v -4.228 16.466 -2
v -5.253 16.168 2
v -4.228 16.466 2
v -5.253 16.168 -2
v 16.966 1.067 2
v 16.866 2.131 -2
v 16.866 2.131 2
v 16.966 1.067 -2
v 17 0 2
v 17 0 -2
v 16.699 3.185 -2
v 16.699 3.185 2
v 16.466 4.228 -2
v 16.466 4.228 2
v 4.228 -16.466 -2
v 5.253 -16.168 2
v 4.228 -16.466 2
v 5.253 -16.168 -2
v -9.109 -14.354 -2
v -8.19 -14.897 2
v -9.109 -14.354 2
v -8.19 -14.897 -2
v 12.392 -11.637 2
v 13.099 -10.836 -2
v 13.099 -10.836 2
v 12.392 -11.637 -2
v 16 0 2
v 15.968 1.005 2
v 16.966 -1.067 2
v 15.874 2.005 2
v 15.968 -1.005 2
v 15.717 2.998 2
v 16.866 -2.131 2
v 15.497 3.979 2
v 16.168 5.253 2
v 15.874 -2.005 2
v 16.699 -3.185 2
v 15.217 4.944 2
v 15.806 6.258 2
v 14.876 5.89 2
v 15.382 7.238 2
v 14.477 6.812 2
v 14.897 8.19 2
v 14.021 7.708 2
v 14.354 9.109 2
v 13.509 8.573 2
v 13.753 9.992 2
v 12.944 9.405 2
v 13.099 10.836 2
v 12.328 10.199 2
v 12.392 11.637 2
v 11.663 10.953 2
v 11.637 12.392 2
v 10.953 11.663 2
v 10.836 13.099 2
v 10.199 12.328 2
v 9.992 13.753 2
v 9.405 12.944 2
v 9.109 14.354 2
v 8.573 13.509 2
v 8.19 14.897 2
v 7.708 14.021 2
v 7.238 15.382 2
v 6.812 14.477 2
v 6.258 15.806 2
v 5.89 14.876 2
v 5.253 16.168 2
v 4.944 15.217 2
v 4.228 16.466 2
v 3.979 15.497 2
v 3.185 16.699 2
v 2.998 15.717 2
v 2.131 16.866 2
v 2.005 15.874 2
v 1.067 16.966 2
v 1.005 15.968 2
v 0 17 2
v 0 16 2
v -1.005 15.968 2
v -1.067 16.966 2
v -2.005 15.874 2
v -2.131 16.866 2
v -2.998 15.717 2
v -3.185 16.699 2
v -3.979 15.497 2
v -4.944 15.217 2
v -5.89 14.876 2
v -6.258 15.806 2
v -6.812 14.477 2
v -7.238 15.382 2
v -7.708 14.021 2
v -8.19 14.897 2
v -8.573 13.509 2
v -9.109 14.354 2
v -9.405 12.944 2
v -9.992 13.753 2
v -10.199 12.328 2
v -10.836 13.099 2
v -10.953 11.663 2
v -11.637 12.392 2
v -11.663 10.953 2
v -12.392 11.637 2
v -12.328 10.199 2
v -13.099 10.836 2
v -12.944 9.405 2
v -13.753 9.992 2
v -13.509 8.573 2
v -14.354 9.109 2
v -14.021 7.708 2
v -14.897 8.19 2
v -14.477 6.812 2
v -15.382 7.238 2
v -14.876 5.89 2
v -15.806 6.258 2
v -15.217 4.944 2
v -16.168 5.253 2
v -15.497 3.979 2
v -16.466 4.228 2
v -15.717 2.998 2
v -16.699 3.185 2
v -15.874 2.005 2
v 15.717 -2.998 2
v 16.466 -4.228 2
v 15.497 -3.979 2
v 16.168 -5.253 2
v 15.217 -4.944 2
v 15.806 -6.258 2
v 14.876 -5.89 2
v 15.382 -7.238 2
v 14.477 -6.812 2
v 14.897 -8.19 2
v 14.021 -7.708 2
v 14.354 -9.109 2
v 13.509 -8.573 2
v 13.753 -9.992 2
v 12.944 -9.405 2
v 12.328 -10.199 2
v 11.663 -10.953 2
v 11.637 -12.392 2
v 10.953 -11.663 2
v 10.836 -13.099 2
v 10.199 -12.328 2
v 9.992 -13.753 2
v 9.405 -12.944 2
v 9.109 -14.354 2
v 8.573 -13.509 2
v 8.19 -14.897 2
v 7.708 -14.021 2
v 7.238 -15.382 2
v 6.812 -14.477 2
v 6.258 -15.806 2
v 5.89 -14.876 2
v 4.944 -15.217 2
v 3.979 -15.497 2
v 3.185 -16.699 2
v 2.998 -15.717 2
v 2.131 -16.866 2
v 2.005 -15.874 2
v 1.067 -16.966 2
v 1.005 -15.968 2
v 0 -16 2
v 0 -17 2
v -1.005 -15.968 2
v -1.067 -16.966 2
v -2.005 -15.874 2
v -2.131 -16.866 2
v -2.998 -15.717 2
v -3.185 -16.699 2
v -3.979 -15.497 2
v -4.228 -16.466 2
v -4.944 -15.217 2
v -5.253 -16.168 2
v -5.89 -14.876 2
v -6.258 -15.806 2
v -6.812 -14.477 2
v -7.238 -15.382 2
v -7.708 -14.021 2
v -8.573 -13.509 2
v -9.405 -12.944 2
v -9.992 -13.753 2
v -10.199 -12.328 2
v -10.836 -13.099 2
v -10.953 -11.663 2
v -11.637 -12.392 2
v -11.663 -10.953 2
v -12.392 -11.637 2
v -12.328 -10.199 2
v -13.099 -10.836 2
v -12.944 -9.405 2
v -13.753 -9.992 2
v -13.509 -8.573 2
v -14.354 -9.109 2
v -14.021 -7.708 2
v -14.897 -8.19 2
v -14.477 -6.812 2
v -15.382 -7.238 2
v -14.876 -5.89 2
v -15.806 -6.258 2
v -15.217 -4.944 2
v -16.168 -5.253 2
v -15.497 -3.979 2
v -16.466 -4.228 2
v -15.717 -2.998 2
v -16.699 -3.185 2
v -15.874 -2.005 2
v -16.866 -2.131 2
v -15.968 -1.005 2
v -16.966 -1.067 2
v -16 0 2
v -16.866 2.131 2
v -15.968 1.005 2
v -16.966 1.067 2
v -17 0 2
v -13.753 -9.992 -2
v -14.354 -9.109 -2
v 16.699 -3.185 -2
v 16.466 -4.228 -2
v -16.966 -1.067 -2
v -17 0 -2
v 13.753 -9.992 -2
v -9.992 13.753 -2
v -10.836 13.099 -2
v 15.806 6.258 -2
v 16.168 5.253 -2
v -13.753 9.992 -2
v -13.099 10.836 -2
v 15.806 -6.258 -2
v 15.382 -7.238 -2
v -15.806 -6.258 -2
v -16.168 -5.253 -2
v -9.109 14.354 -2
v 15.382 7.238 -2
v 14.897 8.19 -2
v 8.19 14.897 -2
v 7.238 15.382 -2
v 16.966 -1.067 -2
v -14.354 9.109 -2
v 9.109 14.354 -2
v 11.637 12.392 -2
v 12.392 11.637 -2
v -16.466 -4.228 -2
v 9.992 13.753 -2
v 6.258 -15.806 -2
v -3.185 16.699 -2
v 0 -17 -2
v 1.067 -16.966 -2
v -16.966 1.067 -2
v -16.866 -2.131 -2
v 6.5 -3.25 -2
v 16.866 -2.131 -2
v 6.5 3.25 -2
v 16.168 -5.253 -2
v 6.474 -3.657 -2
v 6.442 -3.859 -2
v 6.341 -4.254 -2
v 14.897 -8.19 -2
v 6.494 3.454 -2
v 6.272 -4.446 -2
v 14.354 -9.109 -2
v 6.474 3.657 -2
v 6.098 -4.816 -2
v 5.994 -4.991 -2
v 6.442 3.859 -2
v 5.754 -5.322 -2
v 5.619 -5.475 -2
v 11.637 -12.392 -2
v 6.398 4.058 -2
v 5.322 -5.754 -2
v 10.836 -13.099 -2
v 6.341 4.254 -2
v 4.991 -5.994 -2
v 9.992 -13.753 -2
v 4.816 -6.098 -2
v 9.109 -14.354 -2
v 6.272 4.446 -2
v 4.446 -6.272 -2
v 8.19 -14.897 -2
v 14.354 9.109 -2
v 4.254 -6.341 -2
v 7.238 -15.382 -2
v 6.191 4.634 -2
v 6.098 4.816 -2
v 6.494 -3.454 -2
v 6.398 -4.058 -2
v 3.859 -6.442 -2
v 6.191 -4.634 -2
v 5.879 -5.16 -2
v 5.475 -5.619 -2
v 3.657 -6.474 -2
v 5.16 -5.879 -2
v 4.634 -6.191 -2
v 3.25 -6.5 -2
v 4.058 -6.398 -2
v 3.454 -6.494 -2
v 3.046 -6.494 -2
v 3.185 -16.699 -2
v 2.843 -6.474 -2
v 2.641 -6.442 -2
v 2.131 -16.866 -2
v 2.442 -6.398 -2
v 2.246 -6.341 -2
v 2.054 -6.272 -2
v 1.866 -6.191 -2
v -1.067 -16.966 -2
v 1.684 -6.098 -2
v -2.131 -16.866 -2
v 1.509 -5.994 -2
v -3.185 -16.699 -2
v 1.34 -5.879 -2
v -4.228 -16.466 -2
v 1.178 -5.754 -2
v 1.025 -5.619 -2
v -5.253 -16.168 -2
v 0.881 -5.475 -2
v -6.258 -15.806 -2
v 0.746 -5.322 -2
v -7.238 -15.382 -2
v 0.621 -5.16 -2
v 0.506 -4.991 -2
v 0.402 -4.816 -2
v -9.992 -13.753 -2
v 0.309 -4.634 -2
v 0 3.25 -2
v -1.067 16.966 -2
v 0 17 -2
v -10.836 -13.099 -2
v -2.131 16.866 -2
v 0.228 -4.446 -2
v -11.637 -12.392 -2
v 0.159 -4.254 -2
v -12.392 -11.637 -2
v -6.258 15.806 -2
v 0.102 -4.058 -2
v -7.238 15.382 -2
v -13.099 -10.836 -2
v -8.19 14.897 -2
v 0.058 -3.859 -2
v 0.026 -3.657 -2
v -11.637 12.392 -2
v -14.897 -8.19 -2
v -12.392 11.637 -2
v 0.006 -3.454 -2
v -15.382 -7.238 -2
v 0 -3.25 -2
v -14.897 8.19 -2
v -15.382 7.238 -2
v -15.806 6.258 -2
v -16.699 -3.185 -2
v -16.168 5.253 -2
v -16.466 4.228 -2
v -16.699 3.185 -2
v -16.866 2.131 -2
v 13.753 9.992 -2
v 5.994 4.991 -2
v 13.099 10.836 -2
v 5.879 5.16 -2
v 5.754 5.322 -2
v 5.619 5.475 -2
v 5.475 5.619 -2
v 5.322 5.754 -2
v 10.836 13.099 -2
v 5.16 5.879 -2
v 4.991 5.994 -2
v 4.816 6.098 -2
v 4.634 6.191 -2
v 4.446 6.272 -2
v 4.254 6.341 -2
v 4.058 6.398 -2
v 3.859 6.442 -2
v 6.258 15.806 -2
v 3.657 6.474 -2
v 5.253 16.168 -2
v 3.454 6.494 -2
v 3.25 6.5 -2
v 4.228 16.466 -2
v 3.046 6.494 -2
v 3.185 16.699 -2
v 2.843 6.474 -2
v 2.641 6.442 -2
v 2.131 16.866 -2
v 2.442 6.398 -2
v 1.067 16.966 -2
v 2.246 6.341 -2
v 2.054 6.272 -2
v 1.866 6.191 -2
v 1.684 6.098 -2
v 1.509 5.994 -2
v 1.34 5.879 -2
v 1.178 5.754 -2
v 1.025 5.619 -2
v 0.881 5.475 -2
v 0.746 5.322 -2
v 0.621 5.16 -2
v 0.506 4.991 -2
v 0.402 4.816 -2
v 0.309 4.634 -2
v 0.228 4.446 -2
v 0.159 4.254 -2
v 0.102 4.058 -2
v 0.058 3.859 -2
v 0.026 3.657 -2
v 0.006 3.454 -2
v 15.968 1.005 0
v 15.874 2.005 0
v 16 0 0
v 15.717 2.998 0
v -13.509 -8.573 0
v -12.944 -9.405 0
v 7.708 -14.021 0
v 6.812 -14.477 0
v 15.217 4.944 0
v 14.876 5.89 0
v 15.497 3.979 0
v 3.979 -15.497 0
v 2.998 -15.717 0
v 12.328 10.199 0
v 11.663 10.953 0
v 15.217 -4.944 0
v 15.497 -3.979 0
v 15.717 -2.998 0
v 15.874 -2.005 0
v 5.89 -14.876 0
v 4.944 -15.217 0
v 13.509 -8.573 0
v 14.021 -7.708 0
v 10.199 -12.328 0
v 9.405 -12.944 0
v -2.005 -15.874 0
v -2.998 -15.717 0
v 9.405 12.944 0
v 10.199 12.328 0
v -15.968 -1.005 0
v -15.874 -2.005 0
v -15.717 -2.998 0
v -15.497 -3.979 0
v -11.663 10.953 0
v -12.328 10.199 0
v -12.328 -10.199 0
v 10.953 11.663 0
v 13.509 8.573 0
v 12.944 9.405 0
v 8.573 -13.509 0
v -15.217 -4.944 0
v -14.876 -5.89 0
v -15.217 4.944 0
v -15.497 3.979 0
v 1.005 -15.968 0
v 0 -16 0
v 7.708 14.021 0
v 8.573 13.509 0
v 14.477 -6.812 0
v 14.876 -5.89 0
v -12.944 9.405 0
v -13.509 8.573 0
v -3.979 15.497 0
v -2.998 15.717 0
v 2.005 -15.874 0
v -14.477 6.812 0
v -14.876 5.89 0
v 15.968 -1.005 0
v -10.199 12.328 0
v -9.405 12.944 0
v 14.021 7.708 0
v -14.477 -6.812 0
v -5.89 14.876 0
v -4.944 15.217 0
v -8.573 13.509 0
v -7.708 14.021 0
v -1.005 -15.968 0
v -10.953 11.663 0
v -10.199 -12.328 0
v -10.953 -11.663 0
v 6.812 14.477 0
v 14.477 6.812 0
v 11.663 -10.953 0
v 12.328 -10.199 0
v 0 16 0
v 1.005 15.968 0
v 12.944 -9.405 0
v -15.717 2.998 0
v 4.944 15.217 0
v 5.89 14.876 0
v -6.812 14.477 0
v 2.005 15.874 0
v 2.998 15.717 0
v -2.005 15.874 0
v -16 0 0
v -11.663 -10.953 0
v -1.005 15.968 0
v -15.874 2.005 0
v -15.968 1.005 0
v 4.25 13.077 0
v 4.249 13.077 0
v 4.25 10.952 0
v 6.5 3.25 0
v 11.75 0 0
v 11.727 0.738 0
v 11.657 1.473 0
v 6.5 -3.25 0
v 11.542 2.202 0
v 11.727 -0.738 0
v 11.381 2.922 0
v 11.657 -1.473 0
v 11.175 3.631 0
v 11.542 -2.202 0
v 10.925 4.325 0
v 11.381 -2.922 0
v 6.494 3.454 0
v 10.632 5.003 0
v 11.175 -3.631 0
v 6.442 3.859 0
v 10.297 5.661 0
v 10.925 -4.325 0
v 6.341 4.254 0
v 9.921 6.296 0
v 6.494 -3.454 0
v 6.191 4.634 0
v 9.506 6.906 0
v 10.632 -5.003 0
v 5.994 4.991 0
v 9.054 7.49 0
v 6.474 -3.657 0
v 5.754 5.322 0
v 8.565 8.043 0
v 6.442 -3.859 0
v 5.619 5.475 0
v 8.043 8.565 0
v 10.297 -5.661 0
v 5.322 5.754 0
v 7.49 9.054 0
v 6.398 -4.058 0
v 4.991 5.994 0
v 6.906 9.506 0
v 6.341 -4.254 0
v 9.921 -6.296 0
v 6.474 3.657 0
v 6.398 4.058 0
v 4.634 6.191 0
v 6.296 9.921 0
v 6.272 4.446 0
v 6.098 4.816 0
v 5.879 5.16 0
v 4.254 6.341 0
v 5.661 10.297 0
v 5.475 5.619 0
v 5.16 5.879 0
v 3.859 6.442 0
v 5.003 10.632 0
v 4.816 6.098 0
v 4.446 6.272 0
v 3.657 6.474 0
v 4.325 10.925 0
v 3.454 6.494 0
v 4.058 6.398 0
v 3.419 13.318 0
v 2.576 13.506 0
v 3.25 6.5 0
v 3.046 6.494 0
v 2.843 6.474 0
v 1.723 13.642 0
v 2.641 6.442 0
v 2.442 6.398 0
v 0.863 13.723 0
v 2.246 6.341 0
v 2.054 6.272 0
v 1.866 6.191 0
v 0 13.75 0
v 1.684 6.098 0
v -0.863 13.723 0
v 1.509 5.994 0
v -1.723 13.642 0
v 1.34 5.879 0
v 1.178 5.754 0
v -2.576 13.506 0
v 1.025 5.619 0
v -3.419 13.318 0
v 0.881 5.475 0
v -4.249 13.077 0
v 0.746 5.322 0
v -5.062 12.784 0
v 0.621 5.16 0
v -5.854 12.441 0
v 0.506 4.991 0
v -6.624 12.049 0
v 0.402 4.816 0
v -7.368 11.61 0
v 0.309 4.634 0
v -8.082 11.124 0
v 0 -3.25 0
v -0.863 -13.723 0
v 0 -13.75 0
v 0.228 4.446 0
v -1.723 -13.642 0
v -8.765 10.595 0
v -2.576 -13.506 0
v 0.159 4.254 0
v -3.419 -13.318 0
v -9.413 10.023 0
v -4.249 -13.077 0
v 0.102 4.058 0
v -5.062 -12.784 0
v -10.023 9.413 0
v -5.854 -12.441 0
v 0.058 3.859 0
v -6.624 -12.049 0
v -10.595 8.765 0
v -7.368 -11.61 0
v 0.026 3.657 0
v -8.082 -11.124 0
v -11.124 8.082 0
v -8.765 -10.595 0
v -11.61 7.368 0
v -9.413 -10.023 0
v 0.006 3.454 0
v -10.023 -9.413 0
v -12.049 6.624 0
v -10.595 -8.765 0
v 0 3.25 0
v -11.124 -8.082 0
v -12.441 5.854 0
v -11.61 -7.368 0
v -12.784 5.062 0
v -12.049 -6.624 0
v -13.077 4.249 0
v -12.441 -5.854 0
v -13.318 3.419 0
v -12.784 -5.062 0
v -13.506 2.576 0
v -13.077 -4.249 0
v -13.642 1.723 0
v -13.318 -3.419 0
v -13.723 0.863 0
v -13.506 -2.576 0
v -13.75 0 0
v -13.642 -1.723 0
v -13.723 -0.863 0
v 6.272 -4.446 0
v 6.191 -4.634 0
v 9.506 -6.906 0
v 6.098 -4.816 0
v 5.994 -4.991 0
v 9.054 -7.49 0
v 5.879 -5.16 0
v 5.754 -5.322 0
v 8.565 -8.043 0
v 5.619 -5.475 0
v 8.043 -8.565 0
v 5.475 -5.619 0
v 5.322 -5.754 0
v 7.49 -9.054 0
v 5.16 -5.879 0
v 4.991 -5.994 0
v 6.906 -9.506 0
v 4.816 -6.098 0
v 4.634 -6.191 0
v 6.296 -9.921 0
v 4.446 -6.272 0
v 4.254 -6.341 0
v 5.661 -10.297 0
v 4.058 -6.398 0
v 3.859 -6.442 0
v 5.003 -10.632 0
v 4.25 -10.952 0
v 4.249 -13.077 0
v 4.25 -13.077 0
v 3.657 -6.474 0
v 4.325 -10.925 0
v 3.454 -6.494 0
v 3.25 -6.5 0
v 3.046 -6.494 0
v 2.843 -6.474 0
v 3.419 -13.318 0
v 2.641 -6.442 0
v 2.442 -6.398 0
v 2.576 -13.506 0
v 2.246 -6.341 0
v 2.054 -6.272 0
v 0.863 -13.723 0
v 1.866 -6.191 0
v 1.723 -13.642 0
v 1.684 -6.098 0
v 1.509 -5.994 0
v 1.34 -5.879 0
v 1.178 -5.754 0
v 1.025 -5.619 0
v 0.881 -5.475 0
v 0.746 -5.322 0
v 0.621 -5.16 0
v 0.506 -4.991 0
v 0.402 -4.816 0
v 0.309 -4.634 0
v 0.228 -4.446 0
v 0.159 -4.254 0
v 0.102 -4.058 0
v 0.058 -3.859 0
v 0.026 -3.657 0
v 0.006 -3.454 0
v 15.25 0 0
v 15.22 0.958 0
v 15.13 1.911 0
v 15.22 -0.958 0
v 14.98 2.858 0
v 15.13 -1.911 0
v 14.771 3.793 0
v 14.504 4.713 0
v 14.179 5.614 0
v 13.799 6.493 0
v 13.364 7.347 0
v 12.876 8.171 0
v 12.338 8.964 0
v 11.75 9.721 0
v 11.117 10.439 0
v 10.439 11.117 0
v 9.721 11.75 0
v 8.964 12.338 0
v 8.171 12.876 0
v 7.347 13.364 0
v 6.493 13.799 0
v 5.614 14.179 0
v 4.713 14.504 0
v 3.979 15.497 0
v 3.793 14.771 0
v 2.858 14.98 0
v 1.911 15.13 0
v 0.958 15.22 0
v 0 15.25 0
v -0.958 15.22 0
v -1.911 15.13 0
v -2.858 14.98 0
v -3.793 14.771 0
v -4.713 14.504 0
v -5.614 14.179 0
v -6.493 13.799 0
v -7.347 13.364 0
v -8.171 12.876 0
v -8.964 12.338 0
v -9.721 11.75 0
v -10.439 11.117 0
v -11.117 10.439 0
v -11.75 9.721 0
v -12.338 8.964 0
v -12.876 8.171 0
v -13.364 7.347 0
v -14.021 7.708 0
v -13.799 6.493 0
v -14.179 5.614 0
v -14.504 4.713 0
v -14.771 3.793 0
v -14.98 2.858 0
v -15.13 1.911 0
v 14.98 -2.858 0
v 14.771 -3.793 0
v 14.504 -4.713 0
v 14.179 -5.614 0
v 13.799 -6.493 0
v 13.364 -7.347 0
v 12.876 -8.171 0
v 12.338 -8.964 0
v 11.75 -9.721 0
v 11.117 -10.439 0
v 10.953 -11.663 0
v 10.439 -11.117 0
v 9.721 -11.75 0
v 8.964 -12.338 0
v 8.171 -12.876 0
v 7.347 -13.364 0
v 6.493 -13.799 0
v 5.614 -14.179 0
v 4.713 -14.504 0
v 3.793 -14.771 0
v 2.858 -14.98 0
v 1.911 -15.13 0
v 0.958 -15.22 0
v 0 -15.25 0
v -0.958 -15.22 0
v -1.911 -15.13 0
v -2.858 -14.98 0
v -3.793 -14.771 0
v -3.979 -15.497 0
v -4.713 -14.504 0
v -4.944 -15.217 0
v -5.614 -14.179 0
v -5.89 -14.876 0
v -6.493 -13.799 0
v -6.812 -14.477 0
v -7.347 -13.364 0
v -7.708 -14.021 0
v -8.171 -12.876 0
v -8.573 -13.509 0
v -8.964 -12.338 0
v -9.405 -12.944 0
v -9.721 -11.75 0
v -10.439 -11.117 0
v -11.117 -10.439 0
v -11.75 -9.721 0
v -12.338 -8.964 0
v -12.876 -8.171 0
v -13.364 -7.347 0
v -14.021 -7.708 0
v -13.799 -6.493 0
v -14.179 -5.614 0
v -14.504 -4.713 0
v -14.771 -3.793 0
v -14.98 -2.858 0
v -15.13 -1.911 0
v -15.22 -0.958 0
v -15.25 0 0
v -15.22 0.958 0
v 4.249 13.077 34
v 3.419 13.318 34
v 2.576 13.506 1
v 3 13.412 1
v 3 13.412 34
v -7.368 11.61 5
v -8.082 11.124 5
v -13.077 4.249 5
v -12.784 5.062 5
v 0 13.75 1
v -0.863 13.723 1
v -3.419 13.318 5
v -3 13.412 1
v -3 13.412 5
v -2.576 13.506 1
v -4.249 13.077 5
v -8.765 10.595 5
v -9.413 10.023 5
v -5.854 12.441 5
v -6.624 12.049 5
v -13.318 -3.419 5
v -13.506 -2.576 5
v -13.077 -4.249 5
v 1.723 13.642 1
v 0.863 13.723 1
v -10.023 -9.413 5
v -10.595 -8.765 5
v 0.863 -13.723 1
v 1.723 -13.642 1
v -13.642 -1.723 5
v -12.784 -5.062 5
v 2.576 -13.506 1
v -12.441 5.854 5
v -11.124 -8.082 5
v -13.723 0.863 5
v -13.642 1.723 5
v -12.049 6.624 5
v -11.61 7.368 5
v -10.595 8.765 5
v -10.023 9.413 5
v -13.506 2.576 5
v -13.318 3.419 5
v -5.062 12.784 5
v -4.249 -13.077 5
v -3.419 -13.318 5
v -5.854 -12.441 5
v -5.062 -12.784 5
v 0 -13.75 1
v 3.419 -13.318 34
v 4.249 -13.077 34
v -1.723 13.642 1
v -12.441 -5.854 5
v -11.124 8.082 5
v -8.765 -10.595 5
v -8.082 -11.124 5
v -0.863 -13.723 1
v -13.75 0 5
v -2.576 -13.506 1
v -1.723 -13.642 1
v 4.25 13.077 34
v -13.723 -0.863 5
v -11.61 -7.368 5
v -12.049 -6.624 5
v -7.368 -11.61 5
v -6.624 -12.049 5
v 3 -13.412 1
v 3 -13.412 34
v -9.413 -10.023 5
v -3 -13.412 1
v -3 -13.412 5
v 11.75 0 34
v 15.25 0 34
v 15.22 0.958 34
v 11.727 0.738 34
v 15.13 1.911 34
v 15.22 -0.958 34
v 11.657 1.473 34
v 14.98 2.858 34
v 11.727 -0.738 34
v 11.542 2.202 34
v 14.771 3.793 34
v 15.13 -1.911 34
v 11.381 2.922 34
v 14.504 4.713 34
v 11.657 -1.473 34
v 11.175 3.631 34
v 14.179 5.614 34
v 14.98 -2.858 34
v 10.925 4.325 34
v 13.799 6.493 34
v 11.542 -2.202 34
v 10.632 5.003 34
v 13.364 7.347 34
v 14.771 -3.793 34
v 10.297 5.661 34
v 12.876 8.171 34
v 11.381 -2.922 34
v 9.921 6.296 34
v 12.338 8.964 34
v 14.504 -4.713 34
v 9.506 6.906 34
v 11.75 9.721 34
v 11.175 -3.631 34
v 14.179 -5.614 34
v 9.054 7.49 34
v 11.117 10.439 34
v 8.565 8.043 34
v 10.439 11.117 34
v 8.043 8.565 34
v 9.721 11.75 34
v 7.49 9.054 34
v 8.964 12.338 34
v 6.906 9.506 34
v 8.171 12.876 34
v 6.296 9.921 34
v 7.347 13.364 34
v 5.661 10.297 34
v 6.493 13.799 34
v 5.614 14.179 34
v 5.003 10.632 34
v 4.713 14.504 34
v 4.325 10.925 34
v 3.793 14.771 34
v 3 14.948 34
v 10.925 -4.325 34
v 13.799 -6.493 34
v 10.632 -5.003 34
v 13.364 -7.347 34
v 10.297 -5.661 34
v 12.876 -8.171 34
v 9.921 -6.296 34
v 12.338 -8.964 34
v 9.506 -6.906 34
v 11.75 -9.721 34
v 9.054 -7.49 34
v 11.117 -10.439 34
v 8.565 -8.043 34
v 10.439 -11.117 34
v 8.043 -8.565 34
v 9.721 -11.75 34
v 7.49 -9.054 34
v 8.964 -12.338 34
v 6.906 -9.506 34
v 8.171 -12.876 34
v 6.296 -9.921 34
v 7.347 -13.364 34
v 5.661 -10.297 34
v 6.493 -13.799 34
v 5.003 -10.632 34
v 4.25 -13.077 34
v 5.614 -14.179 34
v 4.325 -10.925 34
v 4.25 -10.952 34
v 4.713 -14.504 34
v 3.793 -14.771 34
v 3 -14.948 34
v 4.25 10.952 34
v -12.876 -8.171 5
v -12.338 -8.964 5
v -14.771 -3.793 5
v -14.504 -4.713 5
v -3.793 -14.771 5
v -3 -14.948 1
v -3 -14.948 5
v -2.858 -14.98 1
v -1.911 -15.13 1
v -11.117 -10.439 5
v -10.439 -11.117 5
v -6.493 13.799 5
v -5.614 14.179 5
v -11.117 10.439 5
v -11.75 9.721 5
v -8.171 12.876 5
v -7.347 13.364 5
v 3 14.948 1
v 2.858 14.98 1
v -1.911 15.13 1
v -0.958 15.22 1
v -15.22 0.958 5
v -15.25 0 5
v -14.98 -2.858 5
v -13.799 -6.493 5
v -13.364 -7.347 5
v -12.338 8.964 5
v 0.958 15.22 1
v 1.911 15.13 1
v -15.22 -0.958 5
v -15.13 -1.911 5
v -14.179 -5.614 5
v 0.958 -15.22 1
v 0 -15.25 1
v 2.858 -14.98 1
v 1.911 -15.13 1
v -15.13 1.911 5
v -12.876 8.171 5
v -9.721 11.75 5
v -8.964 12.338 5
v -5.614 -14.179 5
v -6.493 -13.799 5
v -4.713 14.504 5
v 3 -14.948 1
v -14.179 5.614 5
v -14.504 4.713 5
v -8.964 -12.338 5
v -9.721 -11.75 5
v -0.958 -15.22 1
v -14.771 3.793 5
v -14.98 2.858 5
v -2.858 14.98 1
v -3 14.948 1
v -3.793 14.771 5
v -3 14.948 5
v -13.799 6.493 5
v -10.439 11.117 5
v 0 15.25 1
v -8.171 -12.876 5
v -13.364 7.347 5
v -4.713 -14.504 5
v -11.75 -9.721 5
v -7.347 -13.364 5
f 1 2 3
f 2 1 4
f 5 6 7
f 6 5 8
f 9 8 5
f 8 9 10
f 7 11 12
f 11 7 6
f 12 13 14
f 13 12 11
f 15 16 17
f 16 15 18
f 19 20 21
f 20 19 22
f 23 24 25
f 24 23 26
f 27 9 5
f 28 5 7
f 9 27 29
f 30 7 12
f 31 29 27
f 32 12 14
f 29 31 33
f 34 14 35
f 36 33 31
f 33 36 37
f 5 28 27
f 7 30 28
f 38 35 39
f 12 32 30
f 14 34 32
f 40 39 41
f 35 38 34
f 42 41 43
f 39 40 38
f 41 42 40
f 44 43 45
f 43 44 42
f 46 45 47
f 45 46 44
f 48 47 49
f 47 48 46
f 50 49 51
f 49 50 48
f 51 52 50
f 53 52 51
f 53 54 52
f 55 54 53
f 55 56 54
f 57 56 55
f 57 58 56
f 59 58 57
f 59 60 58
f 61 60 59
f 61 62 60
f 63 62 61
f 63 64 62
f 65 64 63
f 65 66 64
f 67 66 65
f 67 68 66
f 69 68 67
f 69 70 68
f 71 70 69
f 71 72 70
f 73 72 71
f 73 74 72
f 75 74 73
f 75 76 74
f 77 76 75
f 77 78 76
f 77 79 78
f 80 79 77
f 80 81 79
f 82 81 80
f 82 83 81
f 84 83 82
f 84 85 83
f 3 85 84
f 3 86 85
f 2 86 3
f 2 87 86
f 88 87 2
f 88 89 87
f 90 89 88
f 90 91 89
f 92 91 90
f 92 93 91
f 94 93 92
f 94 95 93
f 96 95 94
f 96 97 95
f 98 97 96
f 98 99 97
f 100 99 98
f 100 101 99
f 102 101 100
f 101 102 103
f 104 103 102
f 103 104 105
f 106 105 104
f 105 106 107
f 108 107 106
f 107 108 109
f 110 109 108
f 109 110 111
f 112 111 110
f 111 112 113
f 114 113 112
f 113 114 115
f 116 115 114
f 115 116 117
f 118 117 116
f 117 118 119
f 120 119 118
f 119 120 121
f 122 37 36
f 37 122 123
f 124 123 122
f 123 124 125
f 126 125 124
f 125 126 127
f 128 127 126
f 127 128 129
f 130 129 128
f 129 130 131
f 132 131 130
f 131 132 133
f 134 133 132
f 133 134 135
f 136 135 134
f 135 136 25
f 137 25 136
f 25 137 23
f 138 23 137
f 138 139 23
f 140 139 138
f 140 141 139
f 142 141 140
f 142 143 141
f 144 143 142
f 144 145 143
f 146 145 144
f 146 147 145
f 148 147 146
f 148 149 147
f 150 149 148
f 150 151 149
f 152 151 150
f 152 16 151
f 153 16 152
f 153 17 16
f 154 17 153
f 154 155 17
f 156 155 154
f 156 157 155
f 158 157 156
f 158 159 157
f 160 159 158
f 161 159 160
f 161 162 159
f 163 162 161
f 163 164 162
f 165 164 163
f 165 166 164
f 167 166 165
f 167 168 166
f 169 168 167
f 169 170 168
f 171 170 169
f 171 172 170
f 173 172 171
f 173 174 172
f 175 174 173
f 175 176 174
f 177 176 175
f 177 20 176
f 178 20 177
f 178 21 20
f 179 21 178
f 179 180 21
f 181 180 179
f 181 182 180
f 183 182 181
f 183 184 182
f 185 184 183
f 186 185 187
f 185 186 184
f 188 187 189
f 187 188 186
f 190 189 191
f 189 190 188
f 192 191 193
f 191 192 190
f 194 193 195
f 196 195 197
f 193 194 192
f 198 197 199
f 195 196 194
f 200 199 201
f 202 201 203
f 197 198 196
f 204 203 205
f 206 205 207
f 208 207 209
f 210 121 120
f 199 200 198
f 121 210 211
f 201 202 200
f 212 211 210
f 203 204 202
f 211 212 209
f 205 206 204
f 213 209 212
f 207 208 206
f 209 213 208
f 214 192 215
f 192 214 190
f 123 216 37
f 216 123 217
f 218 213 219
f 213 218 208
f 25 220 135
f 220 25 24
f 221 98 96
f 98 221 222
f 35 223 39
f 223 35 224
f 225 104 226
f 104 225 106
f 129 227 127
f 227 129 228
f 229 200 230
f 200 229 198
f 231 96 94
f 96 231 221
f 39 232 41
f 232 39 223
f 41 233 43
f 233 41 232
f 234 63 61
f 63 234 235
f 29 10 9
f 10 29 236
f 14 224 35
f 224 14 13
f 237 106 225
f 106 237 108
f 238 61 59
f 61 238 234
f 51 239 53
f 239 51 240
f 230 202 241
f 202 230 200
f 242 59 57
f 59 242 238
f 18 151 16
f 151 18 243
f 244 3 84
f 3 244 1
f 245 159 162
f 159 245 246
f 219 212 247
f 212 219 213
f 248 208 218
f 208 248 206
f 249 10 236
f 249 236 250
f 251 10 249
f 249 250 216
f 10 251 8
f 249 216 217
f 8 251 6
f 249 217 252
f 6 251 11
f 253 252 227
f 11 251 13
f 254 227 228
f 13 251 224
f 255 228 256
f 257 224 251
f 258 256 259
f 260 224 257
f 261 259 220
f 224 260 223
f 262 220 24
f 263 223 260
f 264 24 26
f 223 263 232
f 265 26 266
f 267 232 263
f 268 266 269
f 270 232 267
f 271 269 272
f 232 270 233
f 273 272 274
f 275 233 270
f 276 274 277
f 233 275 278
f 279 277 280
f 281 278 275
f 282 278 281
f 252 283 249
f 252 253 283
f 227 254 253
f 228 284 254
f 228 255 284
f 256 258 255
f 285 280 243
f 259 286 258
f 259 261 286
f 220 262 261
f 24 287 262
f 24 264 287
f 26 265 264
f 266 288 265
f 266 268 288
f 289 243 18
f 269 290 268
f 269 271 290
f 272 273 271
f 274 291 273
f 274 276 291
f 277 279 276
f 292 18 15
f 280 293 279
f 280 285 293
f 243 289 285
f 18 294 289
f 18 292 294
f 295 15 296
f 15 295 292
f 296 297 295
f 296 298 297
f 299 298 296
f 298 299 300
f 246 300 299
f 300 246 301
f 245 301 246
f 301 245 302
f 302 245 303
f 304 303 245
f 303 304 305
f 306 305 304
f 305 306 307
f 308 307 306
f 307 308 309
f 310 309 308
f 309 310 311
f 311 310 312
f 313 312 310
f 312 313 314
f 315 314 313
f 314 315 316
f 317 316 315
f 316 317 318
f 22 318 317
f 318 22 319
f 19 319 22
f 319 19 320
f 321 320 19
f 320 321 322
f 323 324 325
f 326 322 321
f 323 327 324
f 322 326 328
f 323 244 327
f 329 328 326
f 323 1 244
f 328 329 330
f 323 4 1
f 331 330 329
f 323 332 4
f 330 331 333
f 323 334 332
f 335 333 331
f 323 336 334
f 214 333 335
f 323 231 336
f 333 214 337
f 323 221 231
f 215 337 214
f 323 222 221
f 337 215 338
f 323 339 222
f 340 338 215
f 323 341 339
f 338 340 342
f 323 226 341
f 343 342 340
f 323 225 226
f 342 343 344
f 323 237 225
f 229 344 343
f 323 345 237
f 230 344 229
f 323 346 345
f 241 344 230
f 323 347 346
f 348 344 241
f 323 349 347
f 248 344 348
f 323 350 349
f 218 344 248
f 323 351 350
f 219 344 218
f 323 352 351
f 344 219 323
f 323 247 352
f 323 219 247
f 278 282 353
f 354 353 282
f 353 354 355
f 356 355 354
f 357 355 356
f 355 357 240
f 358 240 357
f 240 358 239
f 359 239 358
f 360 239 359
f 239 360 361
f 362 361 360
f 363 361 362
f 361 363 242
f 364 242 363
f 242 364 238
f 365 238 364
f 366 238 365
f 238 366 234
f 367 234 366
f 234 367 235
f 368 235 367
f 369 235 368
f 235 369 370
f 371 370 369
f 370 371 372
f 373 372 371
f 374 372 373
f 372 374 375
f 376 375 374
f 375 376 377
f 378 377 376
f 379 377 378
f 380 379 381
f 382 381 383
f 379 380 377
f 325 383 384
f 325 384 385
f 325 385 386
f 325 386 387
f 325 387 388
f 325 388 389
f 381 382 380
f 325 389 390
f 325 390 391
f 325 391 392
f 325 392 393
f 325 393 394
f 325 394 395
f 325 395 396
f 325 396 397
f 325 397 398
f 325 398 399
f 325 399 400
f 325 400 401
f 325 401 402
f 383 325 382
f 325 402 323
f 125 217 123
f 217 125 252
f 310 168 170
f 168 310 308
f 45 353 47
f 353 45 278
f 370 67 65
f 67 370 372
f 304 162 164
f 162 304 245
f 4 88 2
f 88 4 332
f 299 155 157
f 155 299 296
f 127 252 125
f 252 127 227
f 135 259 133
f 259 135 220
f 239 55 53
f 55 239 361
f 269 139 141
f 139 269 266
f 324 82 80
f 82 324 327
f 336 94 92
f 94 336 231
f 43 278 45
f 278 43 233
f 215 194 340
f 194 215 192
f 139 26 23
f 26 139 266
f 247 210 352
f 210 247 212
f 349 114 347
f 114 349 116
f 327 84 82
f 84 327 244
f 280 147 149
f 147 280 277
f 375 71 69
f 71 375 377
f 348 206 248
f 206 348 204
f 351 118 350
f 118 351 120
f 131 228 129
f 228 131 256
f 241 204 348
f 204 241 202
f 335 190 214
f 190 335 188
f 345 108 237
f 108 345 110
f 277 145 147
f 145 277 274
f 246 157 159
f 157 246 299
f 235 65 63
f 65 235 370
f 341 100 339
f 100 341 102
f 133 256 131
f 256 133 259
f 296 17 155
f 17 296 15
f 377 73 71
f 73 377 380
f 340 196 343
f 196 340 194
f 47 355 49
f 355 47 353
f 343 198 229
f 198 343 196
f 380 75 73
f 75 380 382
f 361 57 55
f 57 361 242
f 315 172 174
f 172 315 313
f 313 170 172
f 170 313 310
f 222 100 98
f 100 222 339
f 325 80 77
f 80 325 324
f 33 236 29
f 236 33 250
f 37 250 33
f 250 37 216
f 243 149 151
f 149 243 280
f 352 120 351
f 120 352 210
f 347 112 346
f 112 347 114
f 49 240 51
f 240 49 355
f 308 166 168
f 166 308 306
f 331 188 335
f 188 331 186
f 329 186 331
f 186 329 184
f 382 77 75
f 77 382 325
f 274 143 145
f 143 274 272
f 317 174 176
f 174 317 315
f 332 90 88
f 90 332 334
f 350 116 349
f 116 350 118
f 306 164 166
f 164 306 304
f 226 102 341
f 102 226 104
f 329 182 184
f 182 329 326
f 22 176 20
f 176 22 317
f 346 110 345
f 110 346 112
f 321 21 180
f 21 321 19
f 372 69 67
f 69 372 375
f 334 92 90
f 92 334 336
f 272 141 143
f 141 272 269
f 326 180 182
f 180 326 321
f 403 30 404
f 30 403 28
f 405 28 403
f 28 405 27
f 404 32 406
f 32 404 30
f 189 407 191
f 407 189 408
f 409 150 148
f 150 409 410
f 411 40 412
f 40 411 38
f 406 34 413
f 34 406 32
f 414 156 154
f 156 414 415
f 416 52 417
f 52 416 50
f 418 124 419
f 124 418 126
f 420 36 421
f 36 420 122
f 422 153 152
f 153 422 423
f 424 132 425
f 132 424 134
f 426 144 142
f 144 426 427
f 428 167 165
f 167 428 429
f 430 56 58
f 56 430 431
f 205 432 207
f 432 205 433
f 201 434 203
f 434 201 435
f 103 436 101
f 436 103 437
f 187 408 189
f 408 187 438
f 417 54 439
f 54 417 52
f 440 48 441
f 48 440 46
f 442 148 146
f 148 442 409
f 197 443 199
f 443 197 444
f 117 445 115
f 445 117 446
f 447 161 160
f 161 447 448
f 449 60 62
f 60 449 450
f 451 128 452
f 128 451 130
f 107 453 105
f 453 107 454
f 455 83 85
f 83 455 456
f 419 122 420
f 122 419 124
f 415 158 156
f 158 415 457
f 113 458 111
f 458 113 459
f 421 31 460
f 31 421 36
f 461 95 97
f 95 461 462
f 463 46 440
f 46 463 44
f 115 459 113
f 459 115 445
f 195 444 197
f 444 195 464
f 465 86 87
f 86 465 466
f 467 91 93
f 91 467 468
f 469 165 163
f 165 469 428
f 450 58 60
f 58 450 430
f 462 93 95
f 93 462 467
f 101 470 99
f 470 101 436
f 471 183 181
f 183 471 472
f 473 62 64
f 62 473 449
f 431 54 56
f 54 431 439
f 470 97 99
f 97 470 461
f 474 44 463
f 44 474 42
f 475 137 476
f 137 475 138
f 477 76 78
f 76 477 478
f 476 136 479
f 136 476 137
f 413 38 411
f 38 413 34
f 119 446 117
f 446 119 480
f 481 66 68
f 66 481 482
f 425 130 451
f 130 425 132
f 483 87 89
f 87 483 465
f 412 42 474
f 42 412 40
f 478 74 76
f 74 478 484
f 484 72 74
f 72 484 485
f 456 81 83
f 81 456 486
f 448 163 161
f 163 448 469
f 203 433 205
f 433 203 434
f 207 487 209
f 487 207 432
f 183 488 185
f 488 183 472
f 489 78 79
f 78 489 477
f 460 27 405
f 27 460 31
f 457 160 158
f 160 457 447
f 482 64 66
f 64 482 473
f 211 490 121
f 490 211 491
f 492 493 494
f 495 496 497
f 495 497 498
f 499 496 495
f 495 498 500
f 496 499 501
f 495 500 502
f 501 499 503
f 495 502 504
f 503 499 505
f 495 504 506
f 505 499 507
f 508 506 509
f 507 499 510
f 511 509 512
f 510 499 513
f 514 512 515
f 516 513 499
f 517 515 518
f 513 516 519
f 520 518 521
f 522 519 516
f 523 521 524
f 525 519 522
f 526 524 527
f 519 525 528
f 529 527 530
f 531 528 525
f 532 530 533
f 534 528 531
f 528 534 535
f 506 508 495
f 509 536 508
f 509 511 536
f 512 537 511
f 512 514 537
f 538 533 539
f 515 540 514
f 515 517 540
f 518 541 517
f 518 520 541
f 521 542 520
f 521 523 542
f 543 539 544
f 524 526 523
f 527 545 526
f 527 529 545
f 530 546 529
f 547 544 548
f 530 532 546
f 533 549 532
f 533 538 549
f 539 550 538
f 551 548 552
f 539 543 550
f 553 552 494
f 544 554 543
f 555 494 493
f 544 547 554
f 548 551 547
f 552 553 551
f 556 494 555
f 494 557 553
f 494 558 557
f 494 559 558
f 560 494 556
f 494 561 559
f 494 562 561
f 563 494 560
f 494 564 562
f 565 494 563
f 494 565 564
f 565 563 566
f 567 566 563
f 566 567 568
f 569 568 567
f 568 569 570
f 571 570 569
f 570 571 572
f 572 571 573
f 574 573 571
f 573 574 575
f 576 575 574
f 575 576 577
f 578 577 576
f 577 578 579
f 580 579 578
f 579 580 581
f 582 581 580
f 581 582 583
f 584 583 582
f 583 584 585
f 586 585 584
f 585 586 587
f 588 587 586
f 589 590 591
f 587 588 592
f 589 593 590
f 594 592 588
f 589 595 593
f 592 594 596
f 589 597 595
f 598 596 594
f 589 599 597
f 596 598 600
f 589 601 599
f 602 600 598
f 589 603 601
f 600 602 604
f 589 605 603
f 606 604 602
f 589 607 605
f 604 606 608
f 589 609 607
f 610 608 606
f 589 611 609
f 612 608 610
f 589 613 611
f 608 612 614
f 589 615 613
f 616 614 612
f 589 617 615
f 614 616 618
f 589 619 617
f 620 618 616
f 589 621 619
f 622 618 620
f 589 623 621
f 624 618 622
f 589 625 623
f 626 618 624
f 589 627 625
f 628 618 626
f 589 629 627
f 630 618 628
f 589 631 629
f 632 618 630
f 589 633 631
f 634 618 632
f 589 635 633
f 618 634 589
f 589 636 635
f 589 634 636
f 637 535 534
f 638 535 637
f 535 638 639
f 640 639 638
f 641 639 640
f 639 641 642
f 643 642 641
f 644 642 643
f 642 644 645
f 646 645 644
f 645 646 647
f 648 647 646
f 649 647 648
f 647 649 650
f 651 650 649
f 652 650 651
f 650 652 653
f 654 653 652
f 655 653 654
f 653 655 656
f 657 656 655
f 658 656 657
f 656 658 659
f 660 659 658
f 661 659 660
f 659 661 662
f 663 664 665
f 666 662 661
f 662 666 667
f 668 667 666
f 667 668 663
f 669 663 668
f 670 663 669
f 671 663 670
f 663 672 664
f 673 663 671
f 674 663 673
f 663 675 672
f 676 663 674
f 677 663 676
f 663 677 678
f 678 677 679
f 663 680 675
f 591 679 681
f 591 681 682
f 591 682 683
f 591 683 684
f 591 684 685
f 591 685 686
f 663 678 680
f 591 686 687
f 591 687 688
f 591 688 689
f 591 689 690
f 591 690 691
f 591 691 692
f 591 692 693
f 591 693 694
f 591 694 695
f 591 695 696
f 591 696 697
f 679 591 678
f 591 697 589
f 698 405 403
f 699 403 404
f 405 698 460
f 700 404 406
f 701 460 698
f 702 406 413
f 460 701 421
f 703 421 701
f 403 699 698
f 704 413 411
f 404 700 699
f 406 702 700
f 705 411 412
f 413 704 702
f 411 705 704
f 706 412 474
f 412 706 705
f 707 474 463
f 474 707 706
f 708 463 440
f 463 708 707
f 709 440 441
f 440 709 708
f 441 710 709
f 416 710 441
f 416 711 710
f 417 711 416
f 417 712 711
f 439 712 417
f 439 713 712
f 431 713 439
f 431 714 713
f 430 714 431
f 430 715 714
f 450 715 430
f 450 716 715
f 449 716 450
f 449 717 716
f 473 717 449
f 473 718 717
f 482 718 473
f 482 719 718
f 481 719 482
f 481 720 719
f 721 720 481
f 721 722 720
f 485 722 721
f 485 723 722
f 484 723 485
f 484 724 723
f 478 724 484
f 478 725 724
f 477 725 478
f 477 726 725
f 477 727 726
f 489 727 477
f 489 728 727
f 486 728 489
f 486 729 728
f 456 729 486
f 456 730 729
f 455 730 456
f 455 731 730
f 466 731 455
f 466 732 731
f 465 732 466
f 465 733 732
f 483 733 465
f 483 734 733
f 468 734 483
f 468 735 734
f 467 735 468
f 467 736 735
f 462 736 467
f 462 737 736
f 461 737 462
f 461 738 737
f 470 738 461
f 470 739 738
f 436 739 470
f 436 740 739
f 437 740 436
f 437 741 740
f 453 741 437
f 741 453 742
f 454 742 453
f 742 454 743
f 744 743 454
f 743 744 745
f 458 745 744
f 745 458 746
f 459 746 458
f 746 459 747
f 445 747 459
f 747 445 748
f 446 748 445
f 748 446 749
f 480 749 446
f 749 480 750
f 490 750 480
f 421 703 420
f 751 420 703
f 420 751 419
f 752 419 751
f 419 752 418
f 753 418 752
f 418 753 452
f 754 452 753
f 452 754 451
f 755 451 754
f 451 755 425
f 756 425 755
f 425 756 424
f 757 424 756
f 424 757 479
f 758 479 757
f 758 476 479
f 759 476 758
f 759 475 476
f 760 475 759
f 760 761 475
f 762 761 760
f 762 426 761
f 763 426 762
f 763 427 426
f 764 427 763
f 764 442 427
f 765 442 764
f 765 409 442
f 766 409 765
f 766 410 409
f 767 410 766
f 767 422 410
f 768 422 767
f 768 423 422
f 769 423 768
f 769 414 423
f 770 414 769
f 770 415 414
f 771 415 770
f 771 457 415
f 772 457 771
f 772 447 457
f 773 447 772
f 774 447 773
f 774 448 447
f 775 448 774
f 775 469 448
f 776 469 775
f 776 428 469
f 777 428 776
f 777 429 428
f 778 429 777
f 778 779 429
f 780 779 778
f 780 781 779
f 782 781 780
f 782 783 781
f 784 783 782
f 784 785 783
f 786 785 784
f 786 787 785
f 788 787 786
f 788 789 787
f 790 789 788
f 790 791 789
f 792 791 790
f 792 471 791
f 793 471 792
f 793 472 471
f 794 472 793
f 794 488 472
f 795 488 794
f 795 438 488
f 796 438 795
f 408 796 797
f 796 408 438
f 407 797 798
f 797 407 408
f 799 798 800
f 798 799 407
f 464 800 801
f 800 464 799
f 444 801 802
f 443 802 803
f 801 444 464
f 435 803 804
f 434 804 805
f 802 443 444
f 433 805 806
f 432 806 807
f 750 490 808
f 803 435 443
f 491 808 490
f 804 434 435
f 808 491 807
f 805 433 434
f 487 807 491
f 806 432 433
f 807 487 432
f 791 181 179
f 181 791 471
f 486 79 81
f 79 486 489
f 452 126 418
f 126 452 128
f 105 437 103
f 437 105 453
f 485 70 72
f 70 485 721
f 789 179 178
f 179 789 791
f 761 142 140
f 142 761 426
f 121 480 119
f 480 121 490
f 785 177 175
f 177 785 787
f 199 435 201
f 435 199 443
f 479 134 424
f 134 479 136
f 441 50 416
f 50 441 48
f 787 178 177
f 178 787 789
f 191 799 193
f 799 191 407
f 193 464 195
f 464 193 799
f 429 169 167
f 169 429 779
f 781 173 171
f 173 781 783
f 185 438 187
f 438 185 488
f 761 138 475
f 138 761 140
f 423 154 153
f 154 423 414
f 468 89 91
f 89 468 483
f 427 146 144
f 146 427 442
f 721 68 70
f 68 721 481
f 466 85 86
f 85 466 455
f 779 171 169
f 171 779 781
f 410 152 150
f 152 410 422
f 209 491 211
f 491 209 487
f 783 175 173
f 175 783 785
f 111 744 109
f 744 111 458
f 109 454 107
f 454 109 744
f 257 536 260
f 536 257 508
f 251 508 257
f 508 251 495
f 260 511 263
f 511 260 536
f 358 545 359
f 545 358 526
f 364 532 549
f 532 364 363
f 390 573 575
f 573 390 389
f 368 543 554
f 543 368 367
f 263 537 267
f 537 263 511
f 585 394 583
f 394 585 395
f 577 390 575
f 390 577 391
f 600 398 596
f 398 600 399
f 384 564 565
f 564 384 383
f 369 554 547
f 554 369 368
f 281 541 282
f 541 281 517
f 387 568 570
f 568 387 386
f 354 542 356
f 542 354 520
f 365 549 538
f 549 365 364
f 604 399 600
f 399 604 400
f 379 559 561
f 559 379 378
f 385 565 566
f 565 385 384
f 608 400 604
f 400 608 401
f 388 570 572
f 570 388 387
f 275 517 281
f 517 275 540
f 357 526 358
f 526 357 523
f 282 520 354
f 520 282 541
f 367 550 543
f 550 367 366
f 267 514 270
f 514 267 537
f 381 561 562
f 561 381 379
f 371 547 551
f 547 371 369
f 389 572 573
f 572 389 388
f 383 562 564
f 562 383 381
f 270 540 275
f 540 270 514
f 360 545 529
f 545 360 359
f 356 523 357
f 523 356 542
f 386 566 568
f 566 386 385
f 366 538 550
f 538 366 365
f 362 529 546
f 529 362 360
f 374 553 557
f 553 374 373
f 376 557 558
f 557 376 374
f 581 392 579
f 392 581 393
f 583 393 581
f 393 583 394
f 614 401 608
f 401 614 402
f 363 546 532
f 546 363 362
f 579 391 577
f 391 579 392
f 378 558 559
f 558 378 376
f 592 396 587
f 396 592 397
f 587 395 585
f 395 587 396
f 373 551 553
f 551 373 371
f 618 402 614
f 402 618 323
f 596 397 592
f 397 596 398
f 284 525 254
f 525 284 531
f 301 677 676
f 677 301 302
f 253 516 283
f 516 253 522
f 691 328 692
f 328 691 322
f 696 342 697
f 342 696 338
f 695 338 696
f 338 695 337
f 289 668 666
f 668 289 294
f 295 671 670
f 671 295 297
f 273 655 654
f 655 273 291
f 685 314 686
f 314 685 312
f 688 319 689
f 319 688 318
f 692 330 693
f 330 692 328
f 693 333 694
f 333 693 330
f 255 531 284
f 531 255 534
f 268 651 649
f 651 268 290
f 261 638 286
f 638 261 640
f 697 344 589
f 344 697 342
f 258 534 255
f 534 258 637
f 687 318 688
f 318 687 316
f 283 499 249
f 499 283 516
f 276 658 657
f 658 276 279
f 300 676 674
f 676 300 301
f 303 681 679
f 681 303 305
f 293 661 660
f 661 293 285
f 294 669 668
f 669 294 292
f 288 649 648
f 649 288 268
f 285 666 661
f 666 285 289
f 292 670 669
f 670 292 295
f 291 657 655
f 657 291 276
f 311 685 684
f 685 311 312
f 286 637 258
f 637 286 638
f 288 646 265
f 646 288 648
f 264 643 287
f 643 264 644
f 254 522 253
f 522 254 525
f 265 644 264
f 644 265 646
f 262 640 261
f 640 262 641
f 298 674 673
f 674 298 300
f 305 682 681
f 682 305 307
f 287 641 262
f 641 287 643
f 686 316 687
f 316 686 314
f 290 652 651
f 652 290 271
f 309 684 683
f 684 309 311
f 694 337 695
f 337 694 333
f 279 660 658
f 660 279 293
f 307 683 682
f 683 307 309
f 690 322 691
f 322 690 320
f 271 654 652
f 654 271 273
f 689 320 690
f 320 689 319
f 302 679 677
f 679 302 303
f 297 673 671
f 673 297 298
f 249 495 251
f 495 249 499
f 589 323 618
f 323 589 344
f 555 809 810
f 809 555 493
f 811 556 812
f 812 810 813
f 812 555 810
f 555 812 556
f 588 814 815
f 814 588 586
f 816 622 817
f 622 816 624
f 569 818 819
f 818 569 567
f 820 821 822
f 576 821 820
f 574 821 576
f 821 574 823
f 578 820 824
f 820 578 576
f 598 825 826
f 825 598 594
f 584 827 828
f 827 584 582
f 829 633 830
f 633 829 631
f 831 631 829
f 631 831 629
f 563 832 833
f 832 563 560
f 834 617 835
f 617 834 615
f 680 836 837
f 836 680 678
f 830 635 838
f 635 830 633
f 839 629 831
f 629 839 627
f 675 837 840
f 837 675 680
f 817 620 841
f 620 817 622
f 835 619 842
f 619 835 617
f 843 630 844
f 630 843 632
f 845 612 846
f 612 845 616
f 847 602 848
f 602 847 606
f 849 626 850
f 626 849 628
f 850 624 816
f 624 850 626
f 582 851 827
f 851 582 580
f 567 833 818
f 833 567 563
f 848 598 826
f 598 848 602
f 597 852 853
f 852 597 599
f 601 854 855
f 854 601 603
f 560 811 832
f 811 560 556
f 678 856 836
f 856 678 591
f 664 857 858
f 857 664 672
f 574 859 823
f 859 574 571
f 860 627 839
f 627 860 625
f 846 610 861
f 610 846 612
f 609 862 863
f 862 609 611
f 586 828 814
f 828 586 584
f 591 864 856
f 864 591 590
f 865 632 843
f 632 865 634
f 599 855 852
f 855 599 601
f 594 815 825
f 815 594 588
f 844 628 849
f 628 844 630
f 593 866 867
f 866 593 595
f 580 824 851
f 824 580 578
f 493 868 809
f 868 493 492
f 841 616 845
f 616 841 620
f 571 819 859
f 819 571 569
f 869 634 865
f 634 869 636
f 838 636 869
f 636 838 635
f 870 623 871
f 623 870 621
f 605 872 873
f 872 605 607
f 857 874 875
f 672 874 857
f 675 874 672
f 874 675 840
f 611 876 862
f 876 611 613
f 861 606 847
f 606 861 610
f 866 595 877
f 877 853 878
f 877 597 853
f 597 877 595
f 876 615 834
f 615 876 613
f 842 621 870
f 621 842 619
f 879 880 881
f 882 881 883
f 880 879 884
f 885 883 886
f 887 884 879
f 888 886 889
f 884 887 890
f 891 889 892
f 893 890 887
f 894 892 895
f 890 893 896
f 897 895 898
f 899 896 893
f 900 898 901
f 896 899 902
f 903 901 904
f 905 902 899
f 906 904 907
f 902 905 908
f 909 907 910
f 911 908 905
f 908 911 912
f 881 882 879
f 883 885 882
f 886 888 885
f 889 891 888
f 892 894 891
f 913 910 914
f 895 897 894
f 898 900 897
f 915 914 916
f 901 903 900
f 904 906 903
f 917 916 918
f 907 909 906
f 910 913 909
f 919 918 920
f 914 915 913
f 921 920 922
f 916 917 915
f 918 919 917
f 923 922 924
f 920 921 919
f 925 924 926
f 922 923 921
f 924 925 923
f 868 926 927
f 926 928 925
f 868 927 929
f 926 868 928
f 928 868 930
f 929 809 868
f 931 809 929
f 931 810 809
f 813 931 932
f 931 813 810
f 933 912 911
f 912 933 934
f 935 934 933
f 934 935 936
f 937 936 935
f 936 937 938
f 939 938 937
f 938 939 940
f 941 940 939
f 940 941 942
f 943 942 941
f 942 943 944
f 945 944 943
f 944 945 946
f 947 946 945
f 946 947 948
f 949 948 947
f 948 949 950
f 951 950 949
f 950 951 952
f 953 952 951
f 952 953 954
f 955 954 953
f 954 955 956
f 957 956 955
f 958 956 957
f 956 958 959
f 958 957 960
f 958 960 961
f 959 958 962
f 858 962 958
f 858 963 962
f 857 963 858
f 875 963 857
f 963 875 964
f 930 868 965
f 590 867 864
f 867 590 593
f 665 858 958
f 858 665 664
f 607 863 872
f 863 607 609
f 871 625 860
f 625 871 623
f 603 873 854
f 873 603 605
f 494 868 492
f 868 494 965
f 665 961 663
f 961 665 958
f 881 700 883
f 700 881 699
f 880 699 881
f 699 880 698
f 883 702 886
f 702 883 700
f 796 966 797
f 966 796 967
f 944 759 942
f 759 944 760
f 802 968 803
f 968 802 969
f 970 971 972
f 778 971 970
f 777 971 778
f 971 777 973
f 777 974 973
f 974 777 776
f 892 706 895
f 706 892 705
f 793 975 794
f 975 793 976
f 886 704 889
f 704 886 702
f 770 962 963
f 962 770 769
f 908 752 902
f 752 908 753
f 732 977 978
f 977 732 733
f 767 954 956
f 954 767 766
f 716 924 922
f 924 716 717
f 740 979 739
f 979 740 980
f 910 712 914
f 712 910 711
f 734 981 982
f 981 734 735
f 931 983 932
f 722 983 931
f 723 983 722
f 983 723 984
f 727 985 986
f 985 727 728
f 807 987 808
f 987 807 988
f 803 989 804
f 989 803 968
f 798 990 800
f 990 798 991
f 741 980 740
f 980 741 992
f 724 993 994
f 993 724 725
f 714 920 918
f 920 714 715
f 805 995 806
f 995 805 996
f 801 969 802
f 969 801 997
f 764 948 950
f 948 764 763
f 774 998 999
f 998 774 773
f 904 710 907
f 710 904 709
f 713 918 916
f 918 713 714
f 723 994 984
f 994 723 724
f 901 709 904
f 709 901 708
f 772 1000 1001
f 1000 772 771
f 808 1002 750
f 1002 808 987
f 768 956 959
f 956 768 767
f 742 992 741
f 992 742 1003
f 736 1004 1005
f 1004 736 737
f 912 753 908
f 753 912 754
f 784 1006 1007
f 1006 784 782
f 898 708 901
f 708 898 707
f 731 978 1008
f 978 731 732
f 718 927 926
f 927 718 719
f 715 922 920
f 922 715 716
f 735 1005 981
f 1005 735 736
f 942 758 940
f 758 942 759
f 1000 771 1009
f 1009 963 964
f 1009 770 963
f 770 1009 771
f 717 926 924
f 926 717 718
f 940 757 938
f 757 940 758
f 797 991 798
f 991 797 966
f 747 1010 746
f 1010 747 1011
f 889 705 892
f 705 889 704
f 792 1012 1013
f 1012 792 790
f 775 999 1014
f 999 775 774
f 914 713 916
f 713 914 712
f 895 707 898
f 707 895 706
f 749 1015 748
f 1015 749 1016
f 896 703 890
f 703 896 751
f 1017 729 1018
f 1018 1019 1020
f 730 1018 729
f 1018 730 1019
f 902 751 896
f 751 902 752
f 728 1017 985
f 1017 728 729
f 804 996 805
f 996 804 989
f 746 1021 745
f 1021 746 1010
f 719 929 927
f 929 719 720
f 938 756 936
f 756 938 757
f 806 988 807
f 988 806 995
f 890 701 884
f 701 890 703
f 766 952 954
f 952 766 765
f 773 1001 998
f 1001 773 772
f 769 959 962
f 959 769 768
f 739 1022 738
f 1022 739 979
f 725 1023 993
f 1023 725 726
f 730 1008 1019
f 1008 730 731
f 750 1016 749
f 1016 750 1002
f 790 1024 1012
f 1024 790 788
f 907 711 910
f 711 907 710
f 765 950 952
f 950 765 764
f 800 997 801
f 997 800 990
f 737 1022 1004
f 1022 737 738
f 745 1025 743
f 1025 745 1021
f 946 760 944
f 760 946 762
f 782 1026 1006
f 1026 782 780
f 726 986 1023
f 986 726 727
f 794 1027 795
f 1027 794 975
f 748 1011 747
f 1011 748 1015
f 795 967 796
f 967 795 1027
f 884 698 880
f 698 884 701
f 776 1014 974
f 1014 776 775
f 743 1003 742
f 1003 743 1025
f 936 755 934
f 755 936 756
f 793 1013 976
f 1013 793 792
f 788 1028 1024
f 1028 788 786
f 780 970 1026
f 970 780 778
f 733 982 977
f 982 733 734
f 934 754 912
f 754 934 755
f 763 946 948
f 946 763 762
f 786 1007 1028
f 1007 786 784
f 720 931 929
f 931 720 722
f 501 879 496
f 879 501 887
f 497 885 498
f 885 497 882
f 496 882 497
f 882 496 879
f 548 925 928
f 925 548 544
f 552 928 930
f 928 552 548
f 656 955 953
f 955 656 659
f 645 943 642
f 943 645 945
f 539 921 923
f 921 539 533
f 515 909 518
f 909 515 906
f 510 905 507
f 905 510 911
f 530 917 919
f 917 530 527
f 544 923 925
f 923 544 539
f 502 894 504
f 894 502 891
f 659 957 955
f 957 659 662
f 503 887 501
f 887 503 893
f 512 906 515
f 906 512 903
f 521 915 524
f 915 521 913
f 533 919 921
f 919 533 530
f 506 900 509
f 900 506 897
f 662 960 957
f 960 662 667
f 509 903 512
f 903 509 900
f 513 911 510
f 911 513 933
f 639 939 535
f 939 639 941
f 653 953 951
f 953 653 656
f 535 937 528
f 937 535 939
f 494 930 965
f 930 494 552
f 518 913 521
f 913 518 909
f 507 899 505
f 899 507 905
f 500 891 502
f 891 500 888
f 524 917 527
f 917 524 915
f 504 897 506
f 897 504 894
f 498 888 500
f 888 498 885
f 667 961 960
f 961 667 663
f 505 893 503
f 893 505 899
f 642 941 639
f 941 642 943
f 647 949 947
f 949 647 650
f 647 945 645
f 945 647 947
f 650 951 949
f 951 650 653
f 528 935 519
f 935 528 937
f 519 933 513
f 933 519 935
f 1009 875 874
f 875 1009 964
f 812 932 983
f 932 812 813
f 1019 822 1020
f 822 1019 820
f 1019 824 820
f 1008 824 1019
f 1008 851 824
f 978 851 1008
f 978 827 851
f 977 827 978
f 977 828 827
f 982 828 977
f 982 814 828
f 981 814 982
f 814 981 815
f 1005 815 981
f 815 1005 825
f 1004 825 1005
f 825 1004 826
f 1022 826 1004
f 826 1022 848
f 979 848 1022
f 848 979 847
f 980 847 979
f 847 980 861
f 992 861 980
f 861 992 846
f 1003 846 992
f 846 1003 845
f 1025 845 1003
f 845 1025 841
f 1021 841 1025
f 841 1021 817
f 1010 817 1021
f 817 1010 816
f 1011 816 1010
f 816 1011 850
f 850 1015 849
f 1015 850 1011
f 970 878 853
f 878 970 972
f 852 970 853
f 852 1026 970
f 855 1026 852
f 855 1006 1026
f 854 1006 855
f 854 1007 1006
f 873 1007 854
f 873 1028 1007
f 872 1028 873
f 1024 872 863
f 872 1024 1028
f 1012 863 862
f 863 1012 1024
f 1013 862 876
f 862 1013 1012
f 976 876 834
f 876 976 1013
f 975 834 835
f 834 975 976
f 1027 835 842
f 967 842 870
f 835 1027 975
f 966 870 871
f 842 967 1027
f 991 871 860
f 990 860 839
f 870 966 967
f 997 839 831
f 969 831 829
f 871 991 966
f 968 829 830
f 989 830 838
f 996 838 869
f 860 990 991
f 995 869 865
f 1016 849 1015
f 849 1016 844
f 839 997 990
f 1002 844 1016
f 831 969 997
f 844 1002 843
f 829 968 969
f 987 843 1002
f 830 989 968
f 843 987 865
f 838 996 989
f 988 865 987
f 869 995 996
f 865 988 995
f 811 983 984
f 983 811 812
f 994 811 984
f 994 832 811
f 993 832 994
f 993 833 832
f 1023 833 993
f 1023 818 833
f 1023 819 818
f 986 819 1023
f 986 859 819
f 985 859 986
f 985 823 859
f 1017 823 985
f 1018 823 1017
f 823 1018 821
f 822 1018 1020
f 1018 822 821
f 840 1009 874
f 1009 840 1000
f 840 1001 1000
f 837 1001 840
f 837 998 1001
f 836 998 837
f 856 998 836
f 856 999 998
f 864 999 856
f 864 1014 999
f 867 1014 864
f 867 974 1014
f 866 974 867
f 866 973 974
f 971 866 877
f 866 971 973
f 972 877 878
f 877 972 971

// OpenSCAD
// file: lib.scad
module middle(tube_diameter, adapter_length, adapter_thickness, ring_length, ring_thickness, resolution) {
    difference() {
        cylinder(d = tube_diameter, h = adapter_length, center = false, $fn = resolution);
        cylinder(d = tube_diameter - adapter_thickness, h = adapter_length, center = false, $fn = resolution);
    }

    difference() {
        cylinder(d = tube_diameter + ring_thickness, h = ring_length, center = false, $fn = resolution);
        cylinder(d = tube_diameter - adapter_thickness, h = ring_length, center = false, $fn = resolution);
    }
}

module front(tube_diameter, tube_thickness, ring_thickness, ring_length, front_plate_thickness, inner_length, bottle_diameter, bottle_offset, resolution) {
    difference() {
        cylinder(d = tube_diameter + ring_thickness, h = ring_length + front_plate_thickness, center = true, $fn = resolution);
        translate([0,0,front_plate_thickness/2]) 
            cylinder(d = tube_diameter, h = ring_length, center = true, $fn = resolution);
        translate([bottle_offset/2,0,-front_plate_thickness/2]) 
            cylinder(d = bottle_diameter, h = front_plate_thickness, center = true, $fn = resolution);
    }

    translate([0,0,(ring_length-front_plate_thickness)/2]) difference() {
        translate([0,0,inner_length/2]) 
            cylinder(d = tube_diameter - tube_thickness - 2, h = inner_length, center = true, $fn = resolution);
        translate([bottle_offset/2,0,inner_length/2]) 
            cylinder(d = bottle_diameter, h = inner_length, center = true, $fn = resolution);
    }
}

module rear(tube_diameter, tube_thickness, ring_thickness, inner_ring_thickness, ring_length, inner_ring_length, front_plate_thickness, chip_length, chip_platform_offset, chip_platform_thickness, usb_hole, resolution) {
    // ring and usb hole
    difference() {
        cylinder(d = tube_diameter + ring_thickness, h = ring_length + front_plate_thickness, center = true, $fn = resolution);
        
        translate([0,0,front_plate_thickness/2]) 
            cylinder(d = tube_diameter, h = ring_length, center = true, $fn = resolution);
        
        // usb hole
        translate([usb_hole/2,usb_hole/2,-front_plate_thickness/2]) 
            cylinder(d = usb_hole, h = front_plate_thickness, center = true, $fn = resolution);
        translate([usb_hole/2,-usb_hole/2,-front_plate_thickness/2]) 
            cylinder(d = usb_hole, h = front_plate_thickness, center = true, $fn = resolution);
        translate([usb_hole/2,0,-front_plate_thickness/2]) 
            cube(usb_hole, center = true);
    }

    // inner ring and chip platform
    difference() {
        inner_ring_remover_size = (chip_length < (tube_diameter - tube_thickness)) ? tube_diameter - tube_thickness : chip_length;
        inner_ring_remover_offset =  (usb_hole < chip_platform_offset) ? usb_hole : chip_platform_offset;

        // inner ring
        translate([0,0,chip_length/2]) 
            cylinder(d = tube_diameter - tube_thickness, h = chip_length, center = true, $fn = resolution);
        difference() {
            translate([0,0,chip_length/2]) 
                cylinder(d = tube_diameter - tube_thickness - inner_ring_thickness, h = chip_length, center = true, $fn = resolution);

            // chip platform
            translate([(tube_diameter - tube_thickness)/2 + chip_platform_offset,0,inner_ring_remover_size/2]) 
                cube(inner_ring_remover_size, center = true); 
        }
        
        // chip platform ring
        translate([0,0,chip_length/2]) 
            cylinder(d = tube_diameter - tube_thickness - inner_ring_thickness - chip_platform_thickness, h = chip_length, center = true, $fn = resolution);

        // upper inner ring thickness
        translate([-inner_ring_remover_size/2 + inner_ring_remover_offset/2,0,inner_ring_remover_size/2 + inner_ring_length])
            cube(inner_ring_remover_size, center = true);

        // inner ring recess
        translate([-inner_ring_remover_offset/2 + inner_ring_remover_offset/2,(inner_ring_remover_size - inner_ring_thickness)/2,inner_ring_remover_offset/2+1]) 
            cube(inner_ring_remover_offset, center = true);
        translate([-inner_ring_remover_offset/2 + inner_ring_remover_offset/2,-(inner_ring_remover_size - inner_ring_thickness)/2,inner_ring_remover_offset/2+1]) 
            cube(inner_ring_remover_offset, center = true);
    }
}
// main file
resolution = 100;
tube_diameter = 32;
tube_thickness = 1.5;

ring_thickness = 2;
inner_ring_thickness = 3;
ring_length = 2;
inner_ring_length = 5;
front_plate_thickness = 2;

chip_length = 34;
chip_platform_offset = 6;
chip_platform_thickness = 4;
usb_hole = 6.5;

use <lib.scad>;

rear(tube_diameter, tube_thickness, ring_thickness, inner_ring_thickness, ring_length, inner_ring_length, front_plate_thickness, chip_length, chip_platform_offset, chip_platform_thickness, usb_hole, resolution);
